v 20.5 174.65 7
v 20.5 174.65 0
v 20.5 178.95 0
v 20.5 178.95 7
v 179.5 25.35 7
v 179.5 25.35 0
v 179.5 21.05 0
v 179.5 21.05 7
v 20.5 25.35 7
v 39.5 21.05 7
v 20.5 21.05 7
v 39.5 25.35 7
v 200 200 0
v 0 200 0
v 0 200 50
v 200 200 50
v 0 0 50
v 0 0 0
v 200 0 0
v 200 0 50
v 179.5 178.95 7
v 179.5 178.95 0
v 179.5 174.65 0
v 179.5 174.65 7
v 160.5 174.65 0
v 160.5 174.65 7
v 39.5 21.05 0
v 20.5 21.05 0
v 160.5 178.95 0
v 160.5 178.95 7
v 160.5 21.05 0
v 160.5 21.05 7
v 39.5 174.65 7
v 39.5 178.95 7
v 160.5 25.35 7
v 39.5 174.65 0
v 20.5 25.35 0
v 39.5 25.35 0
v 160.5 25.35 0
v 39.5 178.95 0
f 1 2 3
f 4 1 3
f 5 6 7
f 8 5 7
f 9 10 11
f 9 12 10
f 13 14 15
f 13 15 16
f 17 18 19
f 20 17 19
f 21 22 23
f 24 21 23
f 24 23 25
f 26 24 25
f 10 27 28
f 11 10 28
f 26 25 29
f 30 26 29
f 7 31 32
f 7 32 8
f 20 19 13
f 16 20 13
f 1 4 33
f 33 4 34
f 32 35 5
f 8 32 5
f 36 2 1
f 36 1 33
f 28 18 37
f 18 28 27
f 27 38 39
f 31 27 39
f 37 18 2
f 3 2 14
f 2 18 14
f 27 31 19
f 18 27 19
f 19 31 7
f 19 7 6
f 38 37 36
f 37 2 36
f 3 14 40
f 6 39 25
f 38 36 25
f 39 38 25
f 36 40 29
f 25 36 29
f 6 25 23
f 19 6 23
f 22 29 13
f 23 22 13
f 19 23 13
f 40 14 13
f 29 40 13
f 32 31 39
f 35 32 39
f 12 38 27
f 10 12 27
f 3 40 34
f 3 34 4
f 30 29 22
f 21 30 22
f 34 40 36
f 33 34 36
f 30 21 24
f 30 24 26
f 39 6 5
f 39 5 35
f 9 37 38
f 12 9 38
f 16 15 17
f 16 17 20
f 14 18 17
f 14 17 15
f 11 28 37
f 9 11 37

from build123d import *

# Parameters (mm, degrees)
ESBO_O1_W                = 200
ESBO_O1_H                = 200
RESSALTO_EXTRUS_O1_DEPTH = 50
CORTE_EXTRUS_O1_DEPTH    = 7


with BuildPart() as part:
    # Esboço1 → Ressalto-extrusão1 (new body)
    with BuildSketch(Plane.XY):
        with Locations((100, 100)):
            Rectangle(ESBO_O1_W, ESBO_O1_H)
    extrude(amount=RESSALTO_EXTRUS_O1_DEPTH)

    # Esboço3 → Corte-extrusão1 (cut)
    with BuildSketch(Plane(origin=(0, 0, 0), x_dir=(-1, 0, 0), z_dir=(0, 0, -1))):
        Polygon((-160.5, 176.55), (-160.5, 177.05), (-160.5, 178.95), (-179.5, 178.95), (-179.5, 177.05), (-179.5, 176.55), (-179.5, 174.65), (-160.5, 174.65), align=None)
        Polygon((-39.5, 177.05), (-39.5, 178.95), (-20.5, 178.95), (-20.5, 177.05), (-20.5, 176.55), (-20.5, 174.65), (-39.5, 174.65), (-39.5, 176.55), align=None)
        Polygon((-39.5, 23.45), (-39.5, 22.95), (-39.5, 21.05), (-20.5, 21.05), (-20.5, 22.95), (-20.5, 23.45), (-20.5, 25.35), (-39.5, 25.35), align=None)
        Polygon((-160.5, 22.95), (-160.5, 21.05), (-179.5, 21.05), (-179.5, 22.95), (-179.5, 23.45), (-179.5, 25.35), (-160.5, 25.35), (-160.5, 23.45), align=None)
    extrude(amount=-CORTE_EXTRUS_O1_DEPTH, mode=Mode.SUBTRACT)


solid = part.part
